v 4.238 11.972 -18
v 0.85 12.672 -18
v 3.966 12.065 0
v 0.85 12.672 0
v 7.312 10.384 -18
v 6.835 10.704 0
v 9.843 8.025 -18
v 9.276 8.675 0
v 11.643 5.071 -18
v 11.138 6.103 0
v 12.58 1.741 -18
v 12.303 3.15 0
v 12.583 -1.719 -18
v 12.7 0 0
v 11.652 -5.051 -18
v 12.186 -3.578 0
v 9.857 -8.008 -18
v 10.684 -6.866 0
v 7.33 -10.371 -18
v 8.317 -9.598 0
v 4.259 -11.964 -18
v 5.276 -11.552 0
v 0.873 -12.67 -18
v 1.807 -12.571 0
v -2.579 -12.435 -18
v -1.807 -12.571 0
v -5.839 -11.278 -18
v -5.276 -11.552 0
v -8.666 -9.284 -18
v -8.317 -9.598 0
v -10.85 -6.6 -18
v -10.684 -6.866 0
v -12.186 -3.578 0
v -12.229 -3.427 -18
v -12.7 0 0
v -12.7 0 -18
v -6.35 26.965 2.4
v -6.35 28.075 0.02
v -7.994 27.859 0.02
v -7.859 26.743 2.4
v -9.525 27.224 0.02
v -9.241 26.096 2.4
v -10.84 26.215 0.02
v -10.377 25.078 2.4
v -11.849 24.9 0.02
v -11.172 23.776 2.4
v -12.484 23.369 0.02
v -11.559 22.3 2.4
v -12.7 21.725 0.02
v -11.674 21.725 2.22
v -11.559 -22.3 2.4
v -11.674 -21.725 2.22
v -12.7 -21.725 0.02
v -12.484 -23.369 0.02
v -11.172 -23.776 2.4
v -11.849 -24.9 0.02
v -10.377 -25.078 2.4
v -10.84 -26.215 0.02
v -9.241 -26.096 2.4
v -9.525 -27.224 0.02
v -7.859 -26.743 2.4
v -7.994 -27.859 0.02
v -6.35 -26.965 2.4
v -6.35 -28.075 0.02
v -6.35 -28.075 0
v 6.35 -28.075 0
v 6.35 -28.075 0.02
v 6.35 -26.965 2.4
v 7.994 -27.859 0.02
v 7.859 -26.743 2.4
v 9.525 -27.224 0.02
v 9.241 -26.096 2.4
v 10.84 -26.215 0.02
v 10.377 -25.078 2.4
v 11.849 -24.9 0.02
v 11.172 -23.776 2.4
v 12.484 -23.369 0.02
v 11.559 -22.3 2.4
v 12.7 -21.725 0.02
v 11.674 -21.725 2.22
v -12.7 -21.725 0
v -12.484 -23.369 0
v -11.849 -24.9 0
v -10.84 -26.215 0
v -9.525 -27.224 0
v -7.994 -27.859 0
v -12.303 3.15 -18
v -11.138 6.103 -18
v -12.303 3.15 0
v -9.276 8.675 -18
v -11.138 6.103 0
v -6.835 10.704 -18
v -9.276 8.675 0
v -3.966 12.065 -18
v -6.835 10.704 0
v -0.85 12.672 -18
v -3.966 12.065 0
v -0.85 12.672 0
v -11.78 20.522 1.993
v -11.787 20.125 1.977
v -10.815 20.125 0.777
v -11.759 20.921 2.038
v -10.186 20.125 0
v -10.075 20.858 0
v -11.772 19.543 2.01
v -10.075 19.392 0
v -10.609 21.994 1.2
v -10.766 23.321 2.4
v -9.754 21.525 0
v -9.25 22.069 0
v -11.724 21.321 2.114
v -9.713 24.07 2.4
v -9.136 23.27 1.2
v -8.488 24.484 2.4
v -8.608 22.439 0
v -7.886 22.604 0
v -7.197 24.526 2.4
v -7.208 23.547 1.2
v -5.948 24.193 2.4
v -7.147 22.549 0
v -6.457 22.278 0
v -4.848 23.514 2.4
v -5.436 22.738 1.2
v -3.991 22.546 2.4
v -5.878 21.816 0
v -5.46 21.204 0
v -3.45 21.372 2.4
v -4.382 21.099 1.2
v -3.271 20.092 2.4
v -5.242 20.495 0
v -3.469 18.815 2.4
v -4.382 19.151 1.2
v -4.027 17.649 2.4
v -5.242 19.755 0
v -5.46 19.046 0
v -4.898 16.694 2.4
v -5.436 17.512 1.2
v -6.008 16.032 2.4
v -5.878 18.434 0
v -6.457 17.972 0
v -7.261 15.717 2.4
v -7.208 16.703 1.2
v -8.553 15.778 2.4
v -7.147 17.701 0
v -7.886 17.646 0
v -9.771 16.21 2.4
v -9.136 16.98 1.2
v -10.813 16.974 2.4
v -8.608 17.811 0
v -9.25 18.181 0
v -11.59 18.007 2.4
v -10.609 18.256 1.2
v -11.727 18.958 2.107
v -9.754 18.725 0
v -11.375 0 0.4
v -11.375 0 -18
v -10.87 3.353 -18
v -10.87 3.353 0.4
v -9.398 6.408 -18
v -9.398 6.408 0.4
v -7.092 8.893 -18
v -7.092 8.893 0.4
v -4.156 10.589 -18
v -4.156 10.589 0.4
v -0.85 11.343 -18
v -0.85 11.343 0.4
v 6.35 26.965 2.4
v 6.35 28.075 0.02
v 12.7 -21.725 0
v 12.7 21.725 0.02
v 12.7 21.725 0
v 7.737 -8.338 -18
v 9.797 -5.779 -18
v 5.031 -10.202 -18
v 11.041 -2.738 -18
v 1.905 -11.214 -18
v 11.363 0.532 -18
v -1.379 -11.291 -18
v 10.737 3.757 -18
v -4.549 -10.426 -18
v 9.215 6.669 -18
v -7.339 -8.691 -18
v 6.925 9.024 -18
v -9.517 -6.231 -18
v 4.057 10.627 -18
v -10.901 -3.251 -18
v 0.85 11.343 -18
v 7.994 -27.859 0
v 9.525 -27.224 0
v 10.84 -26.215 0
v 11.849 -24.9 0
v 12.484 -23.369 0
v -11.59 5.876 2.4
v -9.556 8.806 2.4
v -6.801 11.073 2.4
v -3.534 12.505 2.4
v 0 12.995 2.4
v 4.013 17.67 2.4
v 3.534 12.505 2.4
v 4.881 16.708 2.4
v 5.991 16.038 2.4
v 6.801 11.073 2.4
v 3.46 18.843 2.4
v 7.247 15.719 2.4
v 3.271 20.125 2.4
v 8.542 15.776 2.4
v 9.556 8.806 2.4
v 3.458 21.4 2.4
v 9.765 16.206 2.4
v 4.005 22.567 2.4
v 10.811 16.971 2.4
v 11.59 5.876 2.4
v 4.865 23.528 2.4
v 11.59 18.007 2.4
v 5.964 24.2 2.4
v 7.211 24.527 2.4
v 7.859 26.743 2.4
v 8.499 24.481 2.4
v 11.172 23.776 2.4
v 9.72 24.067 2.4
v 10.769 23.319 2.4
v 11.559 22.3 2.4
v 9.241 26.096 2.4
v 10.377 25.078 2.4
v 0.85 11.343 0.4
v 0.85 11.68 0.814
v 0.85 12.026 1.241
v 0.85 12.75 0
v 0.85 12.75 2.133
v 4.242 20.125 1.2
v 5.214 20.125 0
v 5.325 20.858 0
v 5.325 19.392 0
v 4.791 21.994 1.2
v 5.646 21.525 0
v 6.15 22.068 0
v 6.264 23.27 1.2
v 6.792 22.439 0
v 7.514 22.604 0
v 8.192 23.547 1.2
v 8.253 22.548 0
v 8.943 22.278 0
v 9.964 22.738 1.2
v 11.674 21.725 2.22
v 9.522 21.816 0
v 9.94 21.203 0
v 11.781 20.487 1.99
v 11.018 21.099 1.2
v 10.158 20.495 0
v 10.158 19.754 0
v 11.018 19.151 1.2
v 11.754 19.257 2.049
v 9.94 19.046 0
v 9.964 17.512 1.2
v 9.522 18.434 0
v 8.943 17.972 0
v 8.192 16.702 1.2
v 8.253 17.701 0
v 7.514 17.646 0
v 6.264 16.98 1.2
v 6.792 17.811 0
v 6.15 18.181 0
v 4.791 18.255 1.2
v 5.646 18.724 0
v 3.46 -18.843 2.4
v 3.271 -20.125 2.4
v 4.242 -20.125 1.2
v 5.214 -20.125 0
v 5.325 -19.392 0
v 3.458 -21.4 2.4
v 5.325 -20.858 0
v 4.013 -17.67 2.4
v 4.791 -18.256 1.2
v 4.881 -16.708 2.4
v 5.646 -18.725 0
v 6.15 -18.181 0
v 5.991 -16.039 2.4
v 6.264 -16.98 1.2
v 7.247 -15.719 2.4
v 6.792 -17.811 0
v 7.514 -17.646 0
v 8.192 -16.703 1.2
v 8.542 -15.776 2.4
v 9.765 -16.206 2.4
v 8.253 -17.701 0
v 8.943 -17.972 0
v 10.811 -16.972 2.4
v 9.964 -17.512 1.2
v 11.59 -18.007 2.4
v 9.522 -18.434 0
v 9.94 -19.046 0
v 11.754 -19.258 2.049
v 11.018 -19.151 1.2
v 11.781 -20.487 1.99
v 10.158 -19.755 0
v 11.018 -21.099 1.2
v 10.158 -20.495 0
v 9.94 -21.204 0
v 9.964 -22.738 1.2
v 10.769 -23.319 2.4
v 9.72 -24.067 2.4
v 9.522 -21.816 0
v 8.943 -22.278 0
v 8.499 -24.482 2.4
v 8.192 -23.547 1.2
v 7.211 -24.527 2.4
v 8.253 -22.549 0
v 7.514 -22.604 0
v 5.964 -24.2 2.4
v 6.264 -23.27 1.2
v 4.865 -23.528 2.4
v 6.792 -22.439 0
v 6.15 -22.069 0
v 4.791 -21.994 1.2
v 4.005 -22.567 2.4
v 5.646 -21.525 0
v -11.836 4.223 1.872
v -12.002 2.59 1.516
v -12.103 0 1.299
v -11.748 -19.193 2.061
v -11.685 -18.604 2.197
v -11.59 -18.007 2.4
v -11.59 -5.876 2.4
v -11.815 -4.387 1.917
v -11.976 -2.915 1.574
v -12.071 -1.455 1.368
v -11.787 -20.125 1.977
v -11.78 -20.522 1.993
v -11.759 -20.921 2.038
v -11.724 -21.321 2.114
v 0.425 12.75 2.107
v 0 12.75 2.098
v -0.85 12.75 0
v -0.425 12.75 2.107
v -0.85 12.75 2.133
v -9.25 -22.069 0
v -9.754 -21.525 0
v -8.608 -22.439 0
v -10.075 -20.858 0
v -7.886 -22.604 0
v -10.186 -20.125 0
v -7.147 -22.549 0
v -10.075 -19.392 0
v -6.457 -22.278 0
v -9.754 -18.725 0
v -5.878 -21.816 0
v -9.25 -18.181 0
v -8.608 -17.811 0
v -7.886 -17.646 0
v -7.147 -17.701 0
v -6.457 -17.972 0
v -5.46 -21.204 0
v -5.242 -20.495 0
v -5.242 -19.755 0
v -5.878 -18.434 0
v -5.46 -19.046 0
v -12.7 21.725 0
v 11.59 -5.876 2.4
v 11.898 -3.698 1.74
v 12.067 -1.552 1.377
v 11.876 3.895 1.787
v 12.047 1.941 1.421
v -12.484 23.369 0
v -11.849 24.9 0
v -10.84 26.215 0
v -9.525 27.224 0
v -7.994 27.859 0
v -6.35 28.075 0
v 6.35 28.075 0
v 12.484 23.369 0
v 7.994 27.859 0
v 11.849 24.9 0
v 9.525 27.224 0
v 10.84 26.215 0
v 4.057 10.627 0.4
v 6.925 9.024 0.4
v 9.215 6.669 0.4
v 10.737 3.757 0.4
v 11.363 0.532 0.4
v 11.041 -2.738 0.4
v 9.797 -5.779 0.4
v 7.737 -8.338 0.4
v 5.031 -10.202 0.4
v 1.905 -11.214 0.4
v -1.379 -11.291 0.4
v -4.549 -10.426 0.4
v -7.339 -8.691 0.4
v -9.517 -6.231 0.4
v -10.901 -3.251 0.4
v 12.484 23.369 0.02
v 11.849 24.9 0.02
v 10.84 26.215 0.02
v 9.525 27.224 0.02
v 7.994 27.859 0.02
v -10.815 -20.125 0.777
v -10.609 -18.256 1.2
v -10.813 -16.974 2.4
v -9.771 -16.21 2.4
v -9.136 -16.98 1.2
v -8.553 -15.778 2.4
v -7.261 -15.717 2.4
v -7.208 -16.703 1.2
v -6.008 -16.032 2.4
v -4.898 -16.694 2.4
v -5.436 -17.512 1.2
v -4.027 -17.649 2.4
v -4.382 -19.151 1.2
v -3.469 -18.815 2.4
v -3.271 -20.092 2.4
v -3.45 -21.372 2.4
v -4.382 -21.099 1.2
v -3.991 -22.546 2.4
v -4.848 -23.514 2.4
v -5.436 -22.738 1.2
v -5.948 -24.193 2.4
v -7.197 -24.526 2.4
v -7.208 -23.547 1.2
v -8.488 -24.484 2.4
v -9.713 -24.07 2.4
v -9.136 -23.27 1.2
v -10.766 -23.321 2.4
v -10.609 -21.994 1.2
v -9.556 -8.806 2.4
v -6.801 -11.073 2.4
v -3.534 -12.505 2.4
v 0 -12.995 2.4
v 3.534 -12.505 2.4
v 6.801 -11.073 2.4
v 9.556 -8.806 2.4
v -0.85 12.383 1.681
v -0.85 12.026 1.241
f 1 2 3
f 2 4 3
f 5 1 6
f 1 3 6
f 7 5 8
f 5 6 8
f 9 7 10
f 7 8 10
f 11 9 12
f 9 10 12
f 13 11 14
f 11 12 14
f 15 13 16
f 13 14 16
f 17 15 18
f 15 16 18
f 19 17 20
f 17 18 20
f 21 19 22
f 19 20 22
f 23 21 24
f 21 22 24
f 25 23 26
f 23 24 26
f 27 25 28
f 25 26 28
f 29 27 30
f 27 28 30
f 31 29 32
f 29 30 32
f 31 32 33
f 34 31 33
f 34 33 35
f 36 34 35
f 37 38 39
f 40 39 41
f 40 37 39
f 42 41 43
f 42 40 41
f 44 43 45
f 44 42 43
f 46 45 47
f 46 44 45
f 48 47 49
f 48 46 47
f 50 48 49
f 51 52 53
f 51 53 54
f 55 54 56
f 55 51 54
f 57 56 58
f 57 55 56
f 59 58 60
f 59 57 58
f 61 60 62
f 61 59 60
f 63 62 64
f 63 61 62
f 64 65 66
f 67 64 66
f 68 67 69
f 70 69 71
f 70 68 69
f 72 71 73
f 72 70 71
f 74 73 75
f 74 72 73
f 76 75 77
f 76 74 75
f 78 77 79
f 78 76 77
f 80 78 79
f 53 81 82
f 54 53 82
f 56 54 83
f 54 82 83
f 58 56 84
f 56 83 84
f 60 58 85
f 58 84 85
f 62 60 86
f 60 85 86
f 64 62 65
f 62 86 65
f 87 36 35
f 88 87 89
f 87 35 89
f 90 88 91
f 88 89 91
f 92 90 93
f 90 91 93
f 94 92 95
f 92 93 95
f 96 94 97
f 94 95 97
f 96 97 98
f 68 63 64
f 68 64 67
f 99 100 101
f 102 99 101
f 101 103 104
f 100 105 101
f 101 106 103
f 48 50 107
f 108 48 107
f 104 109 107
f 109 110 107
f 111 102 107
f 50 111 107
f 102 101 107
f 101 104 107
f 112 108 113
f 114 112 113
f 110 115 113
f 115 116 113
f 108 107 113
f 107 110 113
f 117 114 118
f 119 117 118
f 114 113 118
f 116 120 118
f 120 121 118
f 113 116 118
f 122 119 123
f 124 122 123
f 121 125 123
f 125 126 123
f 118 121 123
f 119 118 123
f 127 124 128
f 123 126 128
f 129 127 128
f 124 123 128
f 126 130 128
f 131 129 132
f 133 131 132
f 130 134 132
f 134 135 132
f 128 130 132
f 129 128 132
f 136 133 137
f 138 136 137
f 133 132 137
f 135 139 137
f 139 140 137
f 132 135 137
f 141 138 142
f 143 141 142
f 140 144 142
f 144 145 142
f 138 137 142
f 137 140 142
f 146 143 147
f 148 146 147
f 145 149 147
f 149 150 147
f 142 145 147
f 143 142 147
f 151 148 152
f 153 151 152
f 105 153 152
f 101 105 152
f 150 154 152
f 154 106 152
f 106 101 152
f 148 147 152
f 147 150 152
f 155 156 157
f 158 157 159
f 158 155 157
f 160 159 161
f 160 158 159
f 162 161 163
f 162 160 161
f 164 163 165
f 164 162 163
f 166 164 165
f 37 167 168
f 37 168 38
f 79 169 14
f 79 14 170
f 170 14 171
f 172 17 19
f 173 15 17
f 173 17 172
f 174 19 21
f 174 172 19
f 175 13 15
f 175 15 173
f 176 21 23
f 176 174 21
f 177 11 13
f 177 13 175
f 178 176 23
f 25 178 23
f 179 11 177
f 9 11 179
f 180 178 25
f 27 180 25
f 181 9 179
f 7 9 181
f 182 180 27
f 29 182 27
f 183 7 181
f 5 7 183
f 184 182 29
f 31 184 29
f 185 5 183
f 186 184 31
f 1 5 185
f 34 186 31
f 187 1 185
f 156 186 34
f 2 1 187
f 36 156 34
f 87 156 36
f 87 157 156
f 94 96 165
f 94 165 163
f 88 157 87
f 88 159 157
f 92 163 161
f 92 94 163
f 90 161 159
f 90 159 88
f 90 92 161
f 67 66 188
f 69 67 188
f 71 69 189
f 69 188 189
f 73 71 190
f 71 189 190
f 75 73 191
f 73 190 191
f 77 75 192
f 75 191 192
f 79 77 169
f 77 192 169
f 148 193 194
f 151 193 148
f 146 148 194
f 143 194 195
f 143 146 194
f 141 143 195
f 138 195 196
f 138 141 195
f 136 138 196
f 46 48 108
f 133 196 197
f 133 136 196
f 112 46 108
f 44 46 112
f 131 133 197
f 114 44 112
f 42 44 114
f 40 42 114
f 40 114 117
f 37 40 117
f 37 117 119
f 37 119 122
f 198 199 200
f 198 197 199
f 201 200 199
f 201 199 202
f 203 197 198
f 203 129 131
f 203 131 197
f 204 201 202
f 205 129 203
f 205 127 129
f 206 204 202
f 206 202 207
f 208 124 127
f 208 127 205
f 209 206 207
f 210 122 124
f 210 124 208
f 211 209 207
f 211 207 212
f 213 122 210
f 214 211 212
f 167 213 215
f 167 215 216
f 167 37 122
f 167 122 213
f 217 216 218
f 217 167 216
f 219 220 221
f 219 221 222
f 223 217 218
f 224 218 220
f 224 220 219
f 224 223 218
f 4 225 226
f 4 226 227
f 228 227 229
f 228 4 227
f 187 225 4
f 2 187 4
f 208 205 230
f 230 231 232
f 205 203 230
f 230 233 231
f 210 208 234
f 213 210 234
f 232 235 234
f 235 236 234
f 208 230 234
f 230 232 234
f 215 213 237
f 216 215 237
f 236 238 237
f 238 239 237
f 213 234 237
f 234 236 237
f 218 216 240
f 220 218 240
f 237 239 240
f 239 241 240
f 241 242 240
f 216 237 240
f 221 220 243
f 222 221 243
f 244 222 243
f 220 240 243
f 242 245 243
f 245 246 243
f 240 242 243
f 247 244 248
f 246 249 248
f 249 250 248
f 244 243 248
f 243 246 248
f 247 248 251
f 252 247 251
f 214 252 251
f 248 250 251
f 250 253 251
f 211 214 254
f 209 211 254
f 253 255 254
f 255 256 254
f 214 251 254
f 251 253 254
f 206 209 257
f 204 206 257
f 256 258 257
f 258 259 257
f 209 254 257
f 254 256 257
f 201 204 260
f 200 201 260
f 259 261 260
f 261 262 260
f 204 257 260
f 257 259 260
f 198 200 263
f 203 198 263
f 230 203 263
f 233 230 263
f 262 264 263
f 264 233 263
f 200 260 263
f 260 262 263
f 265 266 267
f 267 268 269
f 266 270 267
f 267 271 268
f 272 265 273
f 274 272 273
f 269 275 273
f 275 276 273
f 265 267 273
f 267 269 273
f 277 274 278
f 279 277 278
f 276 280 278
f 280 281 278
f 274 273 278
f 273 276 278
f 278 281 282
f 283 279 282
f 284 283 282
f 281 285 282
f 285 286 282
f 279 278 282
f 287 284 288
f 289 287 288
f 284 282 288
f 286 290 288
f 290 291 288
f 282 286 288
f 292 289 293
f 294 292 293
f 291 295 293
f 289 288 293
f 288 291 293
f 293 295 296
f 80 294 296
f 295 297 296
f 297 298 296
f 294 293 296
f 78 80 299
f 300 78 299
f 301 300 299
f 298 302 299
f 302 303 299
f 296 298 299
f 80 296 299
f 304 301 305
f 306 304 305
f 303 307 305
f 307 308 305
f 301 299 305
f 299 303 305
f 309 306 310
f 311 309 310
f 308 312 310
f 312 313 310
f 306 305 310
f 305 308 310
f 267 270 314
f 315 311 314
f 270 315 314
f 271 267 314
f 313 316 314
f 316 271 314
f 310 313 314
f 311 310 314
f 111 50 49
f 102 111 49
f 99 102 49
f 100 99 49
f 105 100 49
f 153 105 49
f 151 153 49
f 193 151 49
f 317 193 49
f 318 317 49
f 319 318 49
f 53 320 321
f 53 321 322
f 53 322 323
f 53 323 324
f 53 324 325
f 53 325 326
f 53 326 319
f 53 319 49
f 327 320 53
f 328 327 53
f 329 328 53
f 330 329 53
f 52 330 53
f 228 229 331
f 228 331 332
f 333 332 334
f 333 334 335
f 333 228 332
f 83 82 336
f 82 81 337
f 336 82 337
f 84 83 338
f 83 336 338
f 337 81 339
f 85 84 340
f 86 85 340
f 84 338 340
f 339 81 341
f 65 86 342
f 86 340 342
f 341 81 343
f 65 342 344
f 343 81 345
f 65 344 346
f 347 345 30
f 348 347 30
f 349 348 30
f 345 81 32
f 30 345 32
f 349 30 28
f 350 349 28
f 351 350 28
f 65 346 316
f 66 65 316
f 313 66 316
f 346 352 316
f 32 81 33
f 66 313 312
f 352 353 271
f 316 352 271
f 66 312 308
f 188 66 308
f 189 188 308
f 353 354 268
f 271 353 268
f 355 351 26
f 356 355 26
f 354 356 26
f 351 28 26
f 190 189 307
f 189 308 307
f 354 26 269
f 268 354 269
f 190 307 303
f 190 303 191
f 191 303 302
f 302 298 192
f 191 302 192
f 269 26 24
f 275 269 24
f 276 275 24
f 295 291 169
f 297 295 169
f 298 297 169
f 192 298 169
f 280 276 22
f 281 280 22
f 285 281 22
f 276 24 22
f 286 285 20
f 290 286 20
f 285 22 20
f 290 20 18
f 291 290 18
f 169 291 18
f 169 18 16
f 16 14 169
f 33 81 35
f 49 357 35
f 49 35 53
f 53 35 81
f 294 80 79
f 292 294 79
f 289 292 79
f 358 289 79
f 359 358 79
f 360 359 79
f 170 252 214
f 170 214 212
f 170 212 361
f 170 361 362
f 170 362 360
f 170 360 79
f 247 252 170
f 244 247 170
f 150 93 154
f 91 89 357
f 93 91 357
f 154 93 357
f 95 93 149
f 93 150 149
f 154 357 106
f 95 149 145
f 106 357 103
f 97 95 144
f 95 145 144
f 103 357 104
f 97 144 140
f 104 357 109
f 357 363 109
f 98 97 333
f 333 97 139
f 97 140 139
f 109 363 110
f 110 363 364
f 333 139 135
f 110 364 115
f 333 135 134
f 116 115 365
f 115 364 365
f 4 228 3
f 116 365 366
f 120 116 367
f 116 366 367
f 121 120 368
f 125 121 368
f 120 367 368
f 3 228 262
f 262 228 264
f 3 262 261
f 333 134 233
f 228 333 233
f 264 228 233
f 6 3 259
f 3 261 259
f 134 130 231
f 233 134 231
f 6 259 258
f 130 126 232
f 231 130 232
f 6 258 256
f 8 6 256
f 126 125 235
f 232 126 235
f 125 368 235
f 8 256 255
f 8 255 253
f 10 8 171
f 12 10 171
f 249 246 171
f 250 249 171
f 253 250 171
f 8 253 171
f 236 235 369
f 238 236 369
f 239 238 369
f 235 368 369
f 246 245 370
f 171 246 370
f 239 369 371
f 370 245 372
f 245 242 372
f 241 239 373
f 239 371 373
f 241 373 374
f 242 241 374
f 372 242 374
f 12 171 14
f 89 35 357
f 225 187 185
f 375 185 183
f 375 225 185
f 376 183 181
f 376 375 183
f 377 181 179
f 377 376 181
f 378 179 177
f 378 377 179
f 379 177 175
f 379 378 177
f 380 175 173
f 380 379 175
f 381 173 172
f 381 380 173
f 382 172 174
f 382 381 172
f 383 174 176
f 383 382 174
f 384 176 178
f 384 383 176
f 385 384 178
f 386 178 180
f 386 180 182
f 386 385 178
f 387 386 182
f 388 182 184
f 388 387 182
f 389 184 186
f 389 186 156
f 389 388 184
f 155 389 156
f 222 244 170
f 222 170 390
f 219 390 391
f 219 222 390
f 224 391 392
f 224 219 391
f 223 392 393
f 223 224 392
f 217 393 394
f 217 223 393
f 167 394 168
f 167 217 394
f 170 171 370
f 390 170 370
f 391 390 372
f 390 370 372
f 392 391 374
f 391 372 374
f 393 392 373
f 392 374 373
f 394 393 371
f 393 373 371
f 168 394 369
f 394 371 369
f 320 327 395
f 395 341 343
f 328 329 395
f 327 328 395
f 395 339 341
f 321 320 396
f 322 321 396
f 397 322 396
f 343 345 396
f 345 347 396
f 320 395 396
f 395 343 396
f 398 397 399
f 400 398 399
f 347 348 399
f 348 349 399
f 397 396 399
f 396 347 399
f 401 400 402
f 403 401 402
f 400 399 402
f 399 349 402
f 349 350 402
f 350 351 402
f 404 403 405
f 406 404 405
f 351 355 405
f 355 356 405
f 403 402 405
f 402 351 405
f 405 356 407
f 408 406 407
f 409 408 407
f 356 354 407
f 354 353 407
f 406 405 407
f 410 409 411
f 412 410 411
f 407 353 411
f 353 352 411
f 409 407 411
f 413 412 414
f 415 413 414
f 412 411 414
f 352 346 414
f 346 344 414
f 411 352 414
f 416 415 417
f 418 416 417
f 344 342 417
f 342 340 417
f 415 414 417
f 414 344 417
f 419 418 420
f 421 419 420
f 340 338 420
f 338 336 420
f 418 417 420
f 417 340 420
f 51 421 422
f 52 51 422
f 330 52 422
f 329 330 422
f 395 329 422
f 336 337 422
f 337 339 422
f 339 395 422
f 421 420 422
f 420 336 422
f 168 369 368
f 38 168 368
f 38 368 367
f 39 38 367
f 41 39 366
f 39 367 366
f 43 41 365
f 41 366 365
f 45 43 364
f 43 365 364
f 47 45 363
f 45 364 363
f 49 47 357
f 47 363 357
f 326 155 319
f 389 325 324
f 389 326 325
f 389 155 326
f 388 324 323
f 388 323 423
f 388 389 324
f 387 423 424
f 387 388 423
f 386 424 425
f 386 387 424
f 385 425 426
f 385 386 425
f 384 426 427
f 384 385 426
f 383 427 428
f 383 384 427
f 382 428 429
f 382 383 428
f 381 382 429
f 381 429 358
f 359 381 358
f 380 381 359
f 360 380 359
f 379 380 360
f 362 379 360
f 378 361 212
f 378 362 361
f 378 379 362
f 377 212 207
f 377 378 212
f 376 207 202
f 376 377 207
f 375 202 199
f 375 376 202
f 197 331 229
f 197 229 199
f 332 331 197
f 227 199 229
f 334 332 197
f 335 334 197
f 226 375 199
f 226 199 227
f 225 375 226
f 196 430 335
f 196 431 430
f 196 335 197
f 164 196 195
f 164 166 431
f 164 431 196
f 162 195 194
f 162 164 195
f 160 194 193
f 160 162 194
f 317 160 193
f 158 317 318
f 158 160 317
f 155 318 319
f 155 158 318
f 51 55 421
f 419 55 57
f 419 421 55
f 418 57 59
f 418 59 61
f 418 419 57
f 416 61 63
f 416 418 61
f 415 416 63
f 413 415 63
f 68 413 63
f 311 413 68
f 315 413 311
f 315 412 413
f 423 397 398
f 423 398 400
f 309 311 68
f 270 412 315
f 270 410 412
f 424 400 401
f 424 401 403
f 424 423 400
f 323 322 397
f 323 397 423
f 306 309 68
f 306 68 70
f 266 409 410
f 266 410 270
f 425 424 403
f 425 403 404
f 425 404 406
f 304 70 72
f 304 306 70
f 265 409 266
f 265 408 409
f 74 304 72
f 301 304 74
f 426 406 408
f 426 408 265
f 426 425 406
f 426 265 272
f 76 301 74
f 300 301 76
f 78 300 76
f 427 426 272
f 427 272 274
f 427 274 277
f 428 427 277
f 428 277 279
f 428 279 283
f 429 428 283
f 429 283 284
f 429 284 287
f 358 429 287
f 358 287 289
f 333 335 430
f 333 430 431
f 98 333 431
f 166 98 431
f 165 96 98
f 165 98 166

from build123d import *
from OCP.BRepFilletAPI import BRepFilletAPI_MakeChamfer

# Parameters (mm, degrees)
BOSS_EXTRUDE1_DEPTH = 2.4
SKETCH2_R           = 2
CUT_EXTRUDE1_DEPTH  = 31.907209919
CHAMFER1_SIZE       = 2.38
CHAMFER1_SIZE2      = 1.109812226
SKETCH3_R           = 12.7
SKETCH3_R_2         = 11.375
BOSS_EXTRUDE2_DEPTH = 18
CUT_EXTRUDE2_START  = -30
SKETCH4_R           = 11.375
CUT_EXTRUDE2_DEPTH  = 30
CHAMFER2_SIZE       = 2.4293521
CHAMFER2_SIZE_2     = 3
CHAMFER3_SIZE       = 1.619568066
CHAMFER3_SIZE_2     = 2
CUT_EXTRUDE3_DEPTH  = 37.954778273


with BuildPart() as part:
    # Sketch1 → Boss-Extrude1 (new body)
    with BuildSketch(Plane.XY):
        with BuildLine():
            Line((6.35, 28.075), (-6.35, 28.075))
            ThreePointArc((-6.35, 28.075), (-10.840128061, 26.215128061), (-12.7, 21.725))
            Line((-12.7, 21.725), (-12.7, -21.725))
            ThreePointArc((-12.7, -21.725), (-10.840128061, -26.215128061), (-6.35, -28.075))
            Line((-6.35, -28.075), (6.35, -28.075))
            ThreePointArc((6.35, -28.075), (10.840128061, -26.215128061), (12.7, -21.725))
            Line((12.7, -21.725), (12.7, 21.725))
            ThreePointArc((12.7, 21.725), (10.840128061, 26.215128061), (6.35, 28.075))
        make_face()
    extrude(amount=BOSS_EXTRUDE1_DEPTH)

    # Sketch2 → Cut-Extrude1 (cut, through all)
    with BuildSketch(Plane(origin=(0, 0, 0), x_dir=(-1, 0, 0), z_dir=(0, 0, -1))):
        with Locations((-7.7, 20.1248)):
            Circle(SKETCH2_R)
        with Locations((-7.7, -20.125)):
            Circle(SKETCH2_R)
        with Locations((7.7, 20.125)):
            Circle(SKETCH2_R)
        with Locations((7.7, -20.125)):
            Circle(SKETCH2_R)
    extrude(amount=-CUT_EXTRUDE1_DEPTH, mode=Mode.SUBTRACT)

    # Chamfer1: one chamfer whose edges measure the first distance from different faces: ONE call of the kernel's chamfer builder (chamfer() names one face for all edges)
    chamfer1_edges_1 = [part.edges().sort_by_distance(p)[0] for p in [
        (-10.840128061, 26.215128061, 2.4),
    ]]
    chamfer1_side_1 = [part.faces().sort_by_distance(p)[0] for p in [
        (-10.840128061, 26.215128061, 1.2),
    ]]
    chamfer1_edges_2 = [part.edges().sort_by_distance(p)[0] for p in [
        (-12.7, 0, 2.4),
    ]]
    chamfer1_side_2 = [part.faces().sort_by_distance(p)[0] for p in [
        (-12.7, 0, 1.2),
    ]]
    chamfer1_edges_3 = [part.edges().sort_by_distance(p)[0] for p in [
        (-10.840128061, -26.215128061, 2.4),
    ]]
    chamfer1_side_3 = [part.faces().sort_by_distance(p)[0] for p in [
        (-10.840128061, -26.215128061, 1.2),
    ]]
    chamfer1_edges_4 = [part.edges().sort_by_distance(p)[0] for p in [
        (0, -28.075, 2.4),
    ]]
    chamfer1_side_4 = [part.faces().sort_by_distance(p)[0] for p in [
        (0, -28.075, 1.2),
    ]]
    chamfer1_edges_5 = [part.edges().sort_by_distance(p)[0] for p in [
        (10.840128061, -26.215128061, 2.4),
    ]]
    chamfer1_side_5 = [part.faces().sort_by_distance(p)[0] for p in [
        (10.840128061, -26.215128061, 1.2),
    ]]
    chamfer1_edges_6 = [part.edges().sort_by_distance(p)[0] for p in [
        (12.7, 0, 2.4),
    ]]
    chamfer1_side_6 = [part.faces().sort_by_distance(p)[0] for p in [
        (12.7, 0, 1.2),
    ]]
    chamfer1_edges_7 = [part.edges().sort_by_distance(p)[0] for p in [
        (10.840128061, 26.215128061, 2.4),
    ]]
    chamfer1_side_7 = [part.faces().sort_by_distance(p)[0] for p in [
        (10.840128061, 26.215128061, 1.2),
    ]]
    chamfer1_edges_8 = [part.edges().sort_by_distance(p)[0] for p in [
        (0, 28.075, 2.4),
    ]]
    chamfer1_side_8 = [part.faces().sort_by_distance(p)[0] for p in [
        (0, 28.075, 1.2),
    ]]
    chamfer1 = BRepFilletAPI_MakeChamfer(part.part.solid().wrapped)
    for e in chamfer1_edges_1:
        chamfer1.Add(CHAMFER1_SIZE, CHAMFER1_SIZE2, e.wrapped, chamfer1_side_1[0].wrapped)  # the first distance lies on this face
    for e in chamfer1_edges_2:
        chamfer1.Add(CHAMFER1_SIZE, CHAMFER1_SIZE2, e.wrapped, chamfer1_side_2[0].wrapped)  # the first distance lies on this face
    for e in chamfer1_edges_3:
        chamfer1.Add(CHAMFER1_SIZE, CHAMFER1_SIZE2, e.wrapped, chamfer1_side_3[0].wrapped)  # the first distance lies on this face
    for e in chamfer1_edges_4:
        chamfer1.Add(CHAMFER1_SIZE, CHAMFER1_SIZE2, e.wrapped, chamfer1_side_4[0].wrapped)  # the first distance lies on this face
    for e in chamfer1_edges_5:
        chamfer1.Add(CHAMFER1_SIZE, CHAMFER1_SIZE2, e.wrapped, chamfer1_side_5[0].wrapped)  # the first distance lies on this face
    for e in chamfer1_edges_6:
        chamfer1.Add(CHAMFER1_SIZE, CHAMFER1_SIZE2, e.wrapped, chamfer1_side_6[0].wrapped)  # the first distance lies on this face
    for e in chamfer1_edges_7:
        chamfer1.Add(CHAMFER1_SIZE, CHAMFER1_SIZE2, e.wrapped, chamfer1_side_7[0].wrapped)  # the first distance lies on this face
    for e in chamfer1_edges_8:
        chamfer1.Add(CHAMFER1_SIZE, CHAMFER1_SIZE2, e.wrapped, chamfer1_side_8[0].wrapped)  # the first distance lies on this face
    add(Compound.cast(chamfer1.Shape()), mode=Mode.REPLACE)

    # Sketch3 → Boss-Extrude2 (add)
    with BuildSketch(Plane(origin=(0, 0, 0), x_dir=(-1, 0, 0), z_dir=(0, 0, -1))):
        Circle(SKETCH3_R)
        Circle(SKETCH3_R_2, mode=Mode.SUBTRACT)
    extrude(amount=BOSS_EXTRUDE2_DEPTH)

    # Sketch4 → Cut-Extrude2 (cut)
    with BuildSketch(Plane(origin=(0, 0, 0), x_dir=(-1, 0, 0), z_dir=(0, 0, -1)).offset(CUT_EXTRUDE2_START)):
        Circle(SKETCH4_R)
    extrude(amount=CUT_EXTRUDE2_DEPTH, mode=Mode.SUBTRACT)

    # Chamfer2
    # the kernel refuses this chamfer: 3, 2.4293521 mm, written as the material it takes off along each edge
    with BuildSketch(Plane(origin=(7.7, -20.125, 2.4), x_dir=(-1, 0, 0), z_dir=(0, -1, 0))) as chamfer2_piece_1:
        Polygon((2 + CHAMFER2_SIZE, 0), (2, CHAMFER2_SIZE_2), (2, 0), align=None)
    revolve(axis=Axis((7.7, -20.125, 2.4), (0, 0, -1)), mode=Mode.SUBTRACT)
    with BuildSketch(Plane(origin=(-7.7, -20.125, 2.4), x_dir=(-1, 0, 0), z_dir=(0, -1, 0))) as chamfer2_piece_2:
        Polygon((2 + CHAMFER2_SIZE, 0), (2, CHAMFER2_SIZE_2), (2, 0), align=None)
    revolve(axis=Axis((-7.7, -20.125, 2.4), (0, 0, -1)), mode=Mode.SUBTRACT)
    with BuildSketch(Plane(origin=(7.7, 20.1248, 2.4), x_dir=(-1, 0, 0), z_dir=(0, -1, 0))) as chamfer2_piece_3:
        Polygon((2 + CHAMFER2_SIZE, 0), (2, CHAMFER2_SIZE_2), (2, 0), align=None)
    revolve(axis=Axis((7.7, 20.1248, 2.4), (0, 0, -1)), mode=Mode.SUBTRACT)
    with BuildSketch(Plane(origin=(-7.7, 20.125, 2.4), x_dir=(-1, 0, 0), z_dir=(0, -1, 0))) as chamfer2_piece_4:
        Polygon((2 + CHAMFER2_SIZE, 0), (2, CHAMFER2_SIZE_2), (2, 0), align=None)
    revolve(axis=Axis((-7.7, 20.125, 2.4), (0, 0, -1)), mode=Mode.SUBTRACT)

    # Chamfer3
    # the kernel refuses this chamfer: 2, 1.619568066 mm, written as the material it takes off along each edge
    with BuildSketch(Plane(origin=(0, 0, 2.4), x_dir=(-1, 0, 0), z_dir=(0, 1, 0))) as chamfer3_piece_1:
        Polygon((11.375 + CHAMFER3_SIZE, 0), (11.375, -CHAMFER3_SIZE_2), (11.375, 0), align=None)
    revolve(axis=Axis((0, 0, 2.4), (0, 0, 1)), mode=Mode.SUBTRACT)

    # Sketch5 → Cut-Extrude3 (cut, through all)
    with BuildSketch(Plane(origin=(0, 0, -18), x_dir=(-1, 0, 0), z_dir=(0, 0, -1))):
        with BuildLine():
            Line((-0.85, 11.343197301), (-0.85, 12.75))
            Line((-0.85, 12.75), (0.85, 12.75))
            Line((0.85, 12.75), (0.85, 11.343197301))
            ThreePointArc((0.85, 11.343197301), (0, 11.375), (-0.85, 11.343197301))
        make_face()
    extrude(amount=-CUT_EXTRUDE3_DEPTH, mode=Mode.SUBTRACT)


solid = part.part
